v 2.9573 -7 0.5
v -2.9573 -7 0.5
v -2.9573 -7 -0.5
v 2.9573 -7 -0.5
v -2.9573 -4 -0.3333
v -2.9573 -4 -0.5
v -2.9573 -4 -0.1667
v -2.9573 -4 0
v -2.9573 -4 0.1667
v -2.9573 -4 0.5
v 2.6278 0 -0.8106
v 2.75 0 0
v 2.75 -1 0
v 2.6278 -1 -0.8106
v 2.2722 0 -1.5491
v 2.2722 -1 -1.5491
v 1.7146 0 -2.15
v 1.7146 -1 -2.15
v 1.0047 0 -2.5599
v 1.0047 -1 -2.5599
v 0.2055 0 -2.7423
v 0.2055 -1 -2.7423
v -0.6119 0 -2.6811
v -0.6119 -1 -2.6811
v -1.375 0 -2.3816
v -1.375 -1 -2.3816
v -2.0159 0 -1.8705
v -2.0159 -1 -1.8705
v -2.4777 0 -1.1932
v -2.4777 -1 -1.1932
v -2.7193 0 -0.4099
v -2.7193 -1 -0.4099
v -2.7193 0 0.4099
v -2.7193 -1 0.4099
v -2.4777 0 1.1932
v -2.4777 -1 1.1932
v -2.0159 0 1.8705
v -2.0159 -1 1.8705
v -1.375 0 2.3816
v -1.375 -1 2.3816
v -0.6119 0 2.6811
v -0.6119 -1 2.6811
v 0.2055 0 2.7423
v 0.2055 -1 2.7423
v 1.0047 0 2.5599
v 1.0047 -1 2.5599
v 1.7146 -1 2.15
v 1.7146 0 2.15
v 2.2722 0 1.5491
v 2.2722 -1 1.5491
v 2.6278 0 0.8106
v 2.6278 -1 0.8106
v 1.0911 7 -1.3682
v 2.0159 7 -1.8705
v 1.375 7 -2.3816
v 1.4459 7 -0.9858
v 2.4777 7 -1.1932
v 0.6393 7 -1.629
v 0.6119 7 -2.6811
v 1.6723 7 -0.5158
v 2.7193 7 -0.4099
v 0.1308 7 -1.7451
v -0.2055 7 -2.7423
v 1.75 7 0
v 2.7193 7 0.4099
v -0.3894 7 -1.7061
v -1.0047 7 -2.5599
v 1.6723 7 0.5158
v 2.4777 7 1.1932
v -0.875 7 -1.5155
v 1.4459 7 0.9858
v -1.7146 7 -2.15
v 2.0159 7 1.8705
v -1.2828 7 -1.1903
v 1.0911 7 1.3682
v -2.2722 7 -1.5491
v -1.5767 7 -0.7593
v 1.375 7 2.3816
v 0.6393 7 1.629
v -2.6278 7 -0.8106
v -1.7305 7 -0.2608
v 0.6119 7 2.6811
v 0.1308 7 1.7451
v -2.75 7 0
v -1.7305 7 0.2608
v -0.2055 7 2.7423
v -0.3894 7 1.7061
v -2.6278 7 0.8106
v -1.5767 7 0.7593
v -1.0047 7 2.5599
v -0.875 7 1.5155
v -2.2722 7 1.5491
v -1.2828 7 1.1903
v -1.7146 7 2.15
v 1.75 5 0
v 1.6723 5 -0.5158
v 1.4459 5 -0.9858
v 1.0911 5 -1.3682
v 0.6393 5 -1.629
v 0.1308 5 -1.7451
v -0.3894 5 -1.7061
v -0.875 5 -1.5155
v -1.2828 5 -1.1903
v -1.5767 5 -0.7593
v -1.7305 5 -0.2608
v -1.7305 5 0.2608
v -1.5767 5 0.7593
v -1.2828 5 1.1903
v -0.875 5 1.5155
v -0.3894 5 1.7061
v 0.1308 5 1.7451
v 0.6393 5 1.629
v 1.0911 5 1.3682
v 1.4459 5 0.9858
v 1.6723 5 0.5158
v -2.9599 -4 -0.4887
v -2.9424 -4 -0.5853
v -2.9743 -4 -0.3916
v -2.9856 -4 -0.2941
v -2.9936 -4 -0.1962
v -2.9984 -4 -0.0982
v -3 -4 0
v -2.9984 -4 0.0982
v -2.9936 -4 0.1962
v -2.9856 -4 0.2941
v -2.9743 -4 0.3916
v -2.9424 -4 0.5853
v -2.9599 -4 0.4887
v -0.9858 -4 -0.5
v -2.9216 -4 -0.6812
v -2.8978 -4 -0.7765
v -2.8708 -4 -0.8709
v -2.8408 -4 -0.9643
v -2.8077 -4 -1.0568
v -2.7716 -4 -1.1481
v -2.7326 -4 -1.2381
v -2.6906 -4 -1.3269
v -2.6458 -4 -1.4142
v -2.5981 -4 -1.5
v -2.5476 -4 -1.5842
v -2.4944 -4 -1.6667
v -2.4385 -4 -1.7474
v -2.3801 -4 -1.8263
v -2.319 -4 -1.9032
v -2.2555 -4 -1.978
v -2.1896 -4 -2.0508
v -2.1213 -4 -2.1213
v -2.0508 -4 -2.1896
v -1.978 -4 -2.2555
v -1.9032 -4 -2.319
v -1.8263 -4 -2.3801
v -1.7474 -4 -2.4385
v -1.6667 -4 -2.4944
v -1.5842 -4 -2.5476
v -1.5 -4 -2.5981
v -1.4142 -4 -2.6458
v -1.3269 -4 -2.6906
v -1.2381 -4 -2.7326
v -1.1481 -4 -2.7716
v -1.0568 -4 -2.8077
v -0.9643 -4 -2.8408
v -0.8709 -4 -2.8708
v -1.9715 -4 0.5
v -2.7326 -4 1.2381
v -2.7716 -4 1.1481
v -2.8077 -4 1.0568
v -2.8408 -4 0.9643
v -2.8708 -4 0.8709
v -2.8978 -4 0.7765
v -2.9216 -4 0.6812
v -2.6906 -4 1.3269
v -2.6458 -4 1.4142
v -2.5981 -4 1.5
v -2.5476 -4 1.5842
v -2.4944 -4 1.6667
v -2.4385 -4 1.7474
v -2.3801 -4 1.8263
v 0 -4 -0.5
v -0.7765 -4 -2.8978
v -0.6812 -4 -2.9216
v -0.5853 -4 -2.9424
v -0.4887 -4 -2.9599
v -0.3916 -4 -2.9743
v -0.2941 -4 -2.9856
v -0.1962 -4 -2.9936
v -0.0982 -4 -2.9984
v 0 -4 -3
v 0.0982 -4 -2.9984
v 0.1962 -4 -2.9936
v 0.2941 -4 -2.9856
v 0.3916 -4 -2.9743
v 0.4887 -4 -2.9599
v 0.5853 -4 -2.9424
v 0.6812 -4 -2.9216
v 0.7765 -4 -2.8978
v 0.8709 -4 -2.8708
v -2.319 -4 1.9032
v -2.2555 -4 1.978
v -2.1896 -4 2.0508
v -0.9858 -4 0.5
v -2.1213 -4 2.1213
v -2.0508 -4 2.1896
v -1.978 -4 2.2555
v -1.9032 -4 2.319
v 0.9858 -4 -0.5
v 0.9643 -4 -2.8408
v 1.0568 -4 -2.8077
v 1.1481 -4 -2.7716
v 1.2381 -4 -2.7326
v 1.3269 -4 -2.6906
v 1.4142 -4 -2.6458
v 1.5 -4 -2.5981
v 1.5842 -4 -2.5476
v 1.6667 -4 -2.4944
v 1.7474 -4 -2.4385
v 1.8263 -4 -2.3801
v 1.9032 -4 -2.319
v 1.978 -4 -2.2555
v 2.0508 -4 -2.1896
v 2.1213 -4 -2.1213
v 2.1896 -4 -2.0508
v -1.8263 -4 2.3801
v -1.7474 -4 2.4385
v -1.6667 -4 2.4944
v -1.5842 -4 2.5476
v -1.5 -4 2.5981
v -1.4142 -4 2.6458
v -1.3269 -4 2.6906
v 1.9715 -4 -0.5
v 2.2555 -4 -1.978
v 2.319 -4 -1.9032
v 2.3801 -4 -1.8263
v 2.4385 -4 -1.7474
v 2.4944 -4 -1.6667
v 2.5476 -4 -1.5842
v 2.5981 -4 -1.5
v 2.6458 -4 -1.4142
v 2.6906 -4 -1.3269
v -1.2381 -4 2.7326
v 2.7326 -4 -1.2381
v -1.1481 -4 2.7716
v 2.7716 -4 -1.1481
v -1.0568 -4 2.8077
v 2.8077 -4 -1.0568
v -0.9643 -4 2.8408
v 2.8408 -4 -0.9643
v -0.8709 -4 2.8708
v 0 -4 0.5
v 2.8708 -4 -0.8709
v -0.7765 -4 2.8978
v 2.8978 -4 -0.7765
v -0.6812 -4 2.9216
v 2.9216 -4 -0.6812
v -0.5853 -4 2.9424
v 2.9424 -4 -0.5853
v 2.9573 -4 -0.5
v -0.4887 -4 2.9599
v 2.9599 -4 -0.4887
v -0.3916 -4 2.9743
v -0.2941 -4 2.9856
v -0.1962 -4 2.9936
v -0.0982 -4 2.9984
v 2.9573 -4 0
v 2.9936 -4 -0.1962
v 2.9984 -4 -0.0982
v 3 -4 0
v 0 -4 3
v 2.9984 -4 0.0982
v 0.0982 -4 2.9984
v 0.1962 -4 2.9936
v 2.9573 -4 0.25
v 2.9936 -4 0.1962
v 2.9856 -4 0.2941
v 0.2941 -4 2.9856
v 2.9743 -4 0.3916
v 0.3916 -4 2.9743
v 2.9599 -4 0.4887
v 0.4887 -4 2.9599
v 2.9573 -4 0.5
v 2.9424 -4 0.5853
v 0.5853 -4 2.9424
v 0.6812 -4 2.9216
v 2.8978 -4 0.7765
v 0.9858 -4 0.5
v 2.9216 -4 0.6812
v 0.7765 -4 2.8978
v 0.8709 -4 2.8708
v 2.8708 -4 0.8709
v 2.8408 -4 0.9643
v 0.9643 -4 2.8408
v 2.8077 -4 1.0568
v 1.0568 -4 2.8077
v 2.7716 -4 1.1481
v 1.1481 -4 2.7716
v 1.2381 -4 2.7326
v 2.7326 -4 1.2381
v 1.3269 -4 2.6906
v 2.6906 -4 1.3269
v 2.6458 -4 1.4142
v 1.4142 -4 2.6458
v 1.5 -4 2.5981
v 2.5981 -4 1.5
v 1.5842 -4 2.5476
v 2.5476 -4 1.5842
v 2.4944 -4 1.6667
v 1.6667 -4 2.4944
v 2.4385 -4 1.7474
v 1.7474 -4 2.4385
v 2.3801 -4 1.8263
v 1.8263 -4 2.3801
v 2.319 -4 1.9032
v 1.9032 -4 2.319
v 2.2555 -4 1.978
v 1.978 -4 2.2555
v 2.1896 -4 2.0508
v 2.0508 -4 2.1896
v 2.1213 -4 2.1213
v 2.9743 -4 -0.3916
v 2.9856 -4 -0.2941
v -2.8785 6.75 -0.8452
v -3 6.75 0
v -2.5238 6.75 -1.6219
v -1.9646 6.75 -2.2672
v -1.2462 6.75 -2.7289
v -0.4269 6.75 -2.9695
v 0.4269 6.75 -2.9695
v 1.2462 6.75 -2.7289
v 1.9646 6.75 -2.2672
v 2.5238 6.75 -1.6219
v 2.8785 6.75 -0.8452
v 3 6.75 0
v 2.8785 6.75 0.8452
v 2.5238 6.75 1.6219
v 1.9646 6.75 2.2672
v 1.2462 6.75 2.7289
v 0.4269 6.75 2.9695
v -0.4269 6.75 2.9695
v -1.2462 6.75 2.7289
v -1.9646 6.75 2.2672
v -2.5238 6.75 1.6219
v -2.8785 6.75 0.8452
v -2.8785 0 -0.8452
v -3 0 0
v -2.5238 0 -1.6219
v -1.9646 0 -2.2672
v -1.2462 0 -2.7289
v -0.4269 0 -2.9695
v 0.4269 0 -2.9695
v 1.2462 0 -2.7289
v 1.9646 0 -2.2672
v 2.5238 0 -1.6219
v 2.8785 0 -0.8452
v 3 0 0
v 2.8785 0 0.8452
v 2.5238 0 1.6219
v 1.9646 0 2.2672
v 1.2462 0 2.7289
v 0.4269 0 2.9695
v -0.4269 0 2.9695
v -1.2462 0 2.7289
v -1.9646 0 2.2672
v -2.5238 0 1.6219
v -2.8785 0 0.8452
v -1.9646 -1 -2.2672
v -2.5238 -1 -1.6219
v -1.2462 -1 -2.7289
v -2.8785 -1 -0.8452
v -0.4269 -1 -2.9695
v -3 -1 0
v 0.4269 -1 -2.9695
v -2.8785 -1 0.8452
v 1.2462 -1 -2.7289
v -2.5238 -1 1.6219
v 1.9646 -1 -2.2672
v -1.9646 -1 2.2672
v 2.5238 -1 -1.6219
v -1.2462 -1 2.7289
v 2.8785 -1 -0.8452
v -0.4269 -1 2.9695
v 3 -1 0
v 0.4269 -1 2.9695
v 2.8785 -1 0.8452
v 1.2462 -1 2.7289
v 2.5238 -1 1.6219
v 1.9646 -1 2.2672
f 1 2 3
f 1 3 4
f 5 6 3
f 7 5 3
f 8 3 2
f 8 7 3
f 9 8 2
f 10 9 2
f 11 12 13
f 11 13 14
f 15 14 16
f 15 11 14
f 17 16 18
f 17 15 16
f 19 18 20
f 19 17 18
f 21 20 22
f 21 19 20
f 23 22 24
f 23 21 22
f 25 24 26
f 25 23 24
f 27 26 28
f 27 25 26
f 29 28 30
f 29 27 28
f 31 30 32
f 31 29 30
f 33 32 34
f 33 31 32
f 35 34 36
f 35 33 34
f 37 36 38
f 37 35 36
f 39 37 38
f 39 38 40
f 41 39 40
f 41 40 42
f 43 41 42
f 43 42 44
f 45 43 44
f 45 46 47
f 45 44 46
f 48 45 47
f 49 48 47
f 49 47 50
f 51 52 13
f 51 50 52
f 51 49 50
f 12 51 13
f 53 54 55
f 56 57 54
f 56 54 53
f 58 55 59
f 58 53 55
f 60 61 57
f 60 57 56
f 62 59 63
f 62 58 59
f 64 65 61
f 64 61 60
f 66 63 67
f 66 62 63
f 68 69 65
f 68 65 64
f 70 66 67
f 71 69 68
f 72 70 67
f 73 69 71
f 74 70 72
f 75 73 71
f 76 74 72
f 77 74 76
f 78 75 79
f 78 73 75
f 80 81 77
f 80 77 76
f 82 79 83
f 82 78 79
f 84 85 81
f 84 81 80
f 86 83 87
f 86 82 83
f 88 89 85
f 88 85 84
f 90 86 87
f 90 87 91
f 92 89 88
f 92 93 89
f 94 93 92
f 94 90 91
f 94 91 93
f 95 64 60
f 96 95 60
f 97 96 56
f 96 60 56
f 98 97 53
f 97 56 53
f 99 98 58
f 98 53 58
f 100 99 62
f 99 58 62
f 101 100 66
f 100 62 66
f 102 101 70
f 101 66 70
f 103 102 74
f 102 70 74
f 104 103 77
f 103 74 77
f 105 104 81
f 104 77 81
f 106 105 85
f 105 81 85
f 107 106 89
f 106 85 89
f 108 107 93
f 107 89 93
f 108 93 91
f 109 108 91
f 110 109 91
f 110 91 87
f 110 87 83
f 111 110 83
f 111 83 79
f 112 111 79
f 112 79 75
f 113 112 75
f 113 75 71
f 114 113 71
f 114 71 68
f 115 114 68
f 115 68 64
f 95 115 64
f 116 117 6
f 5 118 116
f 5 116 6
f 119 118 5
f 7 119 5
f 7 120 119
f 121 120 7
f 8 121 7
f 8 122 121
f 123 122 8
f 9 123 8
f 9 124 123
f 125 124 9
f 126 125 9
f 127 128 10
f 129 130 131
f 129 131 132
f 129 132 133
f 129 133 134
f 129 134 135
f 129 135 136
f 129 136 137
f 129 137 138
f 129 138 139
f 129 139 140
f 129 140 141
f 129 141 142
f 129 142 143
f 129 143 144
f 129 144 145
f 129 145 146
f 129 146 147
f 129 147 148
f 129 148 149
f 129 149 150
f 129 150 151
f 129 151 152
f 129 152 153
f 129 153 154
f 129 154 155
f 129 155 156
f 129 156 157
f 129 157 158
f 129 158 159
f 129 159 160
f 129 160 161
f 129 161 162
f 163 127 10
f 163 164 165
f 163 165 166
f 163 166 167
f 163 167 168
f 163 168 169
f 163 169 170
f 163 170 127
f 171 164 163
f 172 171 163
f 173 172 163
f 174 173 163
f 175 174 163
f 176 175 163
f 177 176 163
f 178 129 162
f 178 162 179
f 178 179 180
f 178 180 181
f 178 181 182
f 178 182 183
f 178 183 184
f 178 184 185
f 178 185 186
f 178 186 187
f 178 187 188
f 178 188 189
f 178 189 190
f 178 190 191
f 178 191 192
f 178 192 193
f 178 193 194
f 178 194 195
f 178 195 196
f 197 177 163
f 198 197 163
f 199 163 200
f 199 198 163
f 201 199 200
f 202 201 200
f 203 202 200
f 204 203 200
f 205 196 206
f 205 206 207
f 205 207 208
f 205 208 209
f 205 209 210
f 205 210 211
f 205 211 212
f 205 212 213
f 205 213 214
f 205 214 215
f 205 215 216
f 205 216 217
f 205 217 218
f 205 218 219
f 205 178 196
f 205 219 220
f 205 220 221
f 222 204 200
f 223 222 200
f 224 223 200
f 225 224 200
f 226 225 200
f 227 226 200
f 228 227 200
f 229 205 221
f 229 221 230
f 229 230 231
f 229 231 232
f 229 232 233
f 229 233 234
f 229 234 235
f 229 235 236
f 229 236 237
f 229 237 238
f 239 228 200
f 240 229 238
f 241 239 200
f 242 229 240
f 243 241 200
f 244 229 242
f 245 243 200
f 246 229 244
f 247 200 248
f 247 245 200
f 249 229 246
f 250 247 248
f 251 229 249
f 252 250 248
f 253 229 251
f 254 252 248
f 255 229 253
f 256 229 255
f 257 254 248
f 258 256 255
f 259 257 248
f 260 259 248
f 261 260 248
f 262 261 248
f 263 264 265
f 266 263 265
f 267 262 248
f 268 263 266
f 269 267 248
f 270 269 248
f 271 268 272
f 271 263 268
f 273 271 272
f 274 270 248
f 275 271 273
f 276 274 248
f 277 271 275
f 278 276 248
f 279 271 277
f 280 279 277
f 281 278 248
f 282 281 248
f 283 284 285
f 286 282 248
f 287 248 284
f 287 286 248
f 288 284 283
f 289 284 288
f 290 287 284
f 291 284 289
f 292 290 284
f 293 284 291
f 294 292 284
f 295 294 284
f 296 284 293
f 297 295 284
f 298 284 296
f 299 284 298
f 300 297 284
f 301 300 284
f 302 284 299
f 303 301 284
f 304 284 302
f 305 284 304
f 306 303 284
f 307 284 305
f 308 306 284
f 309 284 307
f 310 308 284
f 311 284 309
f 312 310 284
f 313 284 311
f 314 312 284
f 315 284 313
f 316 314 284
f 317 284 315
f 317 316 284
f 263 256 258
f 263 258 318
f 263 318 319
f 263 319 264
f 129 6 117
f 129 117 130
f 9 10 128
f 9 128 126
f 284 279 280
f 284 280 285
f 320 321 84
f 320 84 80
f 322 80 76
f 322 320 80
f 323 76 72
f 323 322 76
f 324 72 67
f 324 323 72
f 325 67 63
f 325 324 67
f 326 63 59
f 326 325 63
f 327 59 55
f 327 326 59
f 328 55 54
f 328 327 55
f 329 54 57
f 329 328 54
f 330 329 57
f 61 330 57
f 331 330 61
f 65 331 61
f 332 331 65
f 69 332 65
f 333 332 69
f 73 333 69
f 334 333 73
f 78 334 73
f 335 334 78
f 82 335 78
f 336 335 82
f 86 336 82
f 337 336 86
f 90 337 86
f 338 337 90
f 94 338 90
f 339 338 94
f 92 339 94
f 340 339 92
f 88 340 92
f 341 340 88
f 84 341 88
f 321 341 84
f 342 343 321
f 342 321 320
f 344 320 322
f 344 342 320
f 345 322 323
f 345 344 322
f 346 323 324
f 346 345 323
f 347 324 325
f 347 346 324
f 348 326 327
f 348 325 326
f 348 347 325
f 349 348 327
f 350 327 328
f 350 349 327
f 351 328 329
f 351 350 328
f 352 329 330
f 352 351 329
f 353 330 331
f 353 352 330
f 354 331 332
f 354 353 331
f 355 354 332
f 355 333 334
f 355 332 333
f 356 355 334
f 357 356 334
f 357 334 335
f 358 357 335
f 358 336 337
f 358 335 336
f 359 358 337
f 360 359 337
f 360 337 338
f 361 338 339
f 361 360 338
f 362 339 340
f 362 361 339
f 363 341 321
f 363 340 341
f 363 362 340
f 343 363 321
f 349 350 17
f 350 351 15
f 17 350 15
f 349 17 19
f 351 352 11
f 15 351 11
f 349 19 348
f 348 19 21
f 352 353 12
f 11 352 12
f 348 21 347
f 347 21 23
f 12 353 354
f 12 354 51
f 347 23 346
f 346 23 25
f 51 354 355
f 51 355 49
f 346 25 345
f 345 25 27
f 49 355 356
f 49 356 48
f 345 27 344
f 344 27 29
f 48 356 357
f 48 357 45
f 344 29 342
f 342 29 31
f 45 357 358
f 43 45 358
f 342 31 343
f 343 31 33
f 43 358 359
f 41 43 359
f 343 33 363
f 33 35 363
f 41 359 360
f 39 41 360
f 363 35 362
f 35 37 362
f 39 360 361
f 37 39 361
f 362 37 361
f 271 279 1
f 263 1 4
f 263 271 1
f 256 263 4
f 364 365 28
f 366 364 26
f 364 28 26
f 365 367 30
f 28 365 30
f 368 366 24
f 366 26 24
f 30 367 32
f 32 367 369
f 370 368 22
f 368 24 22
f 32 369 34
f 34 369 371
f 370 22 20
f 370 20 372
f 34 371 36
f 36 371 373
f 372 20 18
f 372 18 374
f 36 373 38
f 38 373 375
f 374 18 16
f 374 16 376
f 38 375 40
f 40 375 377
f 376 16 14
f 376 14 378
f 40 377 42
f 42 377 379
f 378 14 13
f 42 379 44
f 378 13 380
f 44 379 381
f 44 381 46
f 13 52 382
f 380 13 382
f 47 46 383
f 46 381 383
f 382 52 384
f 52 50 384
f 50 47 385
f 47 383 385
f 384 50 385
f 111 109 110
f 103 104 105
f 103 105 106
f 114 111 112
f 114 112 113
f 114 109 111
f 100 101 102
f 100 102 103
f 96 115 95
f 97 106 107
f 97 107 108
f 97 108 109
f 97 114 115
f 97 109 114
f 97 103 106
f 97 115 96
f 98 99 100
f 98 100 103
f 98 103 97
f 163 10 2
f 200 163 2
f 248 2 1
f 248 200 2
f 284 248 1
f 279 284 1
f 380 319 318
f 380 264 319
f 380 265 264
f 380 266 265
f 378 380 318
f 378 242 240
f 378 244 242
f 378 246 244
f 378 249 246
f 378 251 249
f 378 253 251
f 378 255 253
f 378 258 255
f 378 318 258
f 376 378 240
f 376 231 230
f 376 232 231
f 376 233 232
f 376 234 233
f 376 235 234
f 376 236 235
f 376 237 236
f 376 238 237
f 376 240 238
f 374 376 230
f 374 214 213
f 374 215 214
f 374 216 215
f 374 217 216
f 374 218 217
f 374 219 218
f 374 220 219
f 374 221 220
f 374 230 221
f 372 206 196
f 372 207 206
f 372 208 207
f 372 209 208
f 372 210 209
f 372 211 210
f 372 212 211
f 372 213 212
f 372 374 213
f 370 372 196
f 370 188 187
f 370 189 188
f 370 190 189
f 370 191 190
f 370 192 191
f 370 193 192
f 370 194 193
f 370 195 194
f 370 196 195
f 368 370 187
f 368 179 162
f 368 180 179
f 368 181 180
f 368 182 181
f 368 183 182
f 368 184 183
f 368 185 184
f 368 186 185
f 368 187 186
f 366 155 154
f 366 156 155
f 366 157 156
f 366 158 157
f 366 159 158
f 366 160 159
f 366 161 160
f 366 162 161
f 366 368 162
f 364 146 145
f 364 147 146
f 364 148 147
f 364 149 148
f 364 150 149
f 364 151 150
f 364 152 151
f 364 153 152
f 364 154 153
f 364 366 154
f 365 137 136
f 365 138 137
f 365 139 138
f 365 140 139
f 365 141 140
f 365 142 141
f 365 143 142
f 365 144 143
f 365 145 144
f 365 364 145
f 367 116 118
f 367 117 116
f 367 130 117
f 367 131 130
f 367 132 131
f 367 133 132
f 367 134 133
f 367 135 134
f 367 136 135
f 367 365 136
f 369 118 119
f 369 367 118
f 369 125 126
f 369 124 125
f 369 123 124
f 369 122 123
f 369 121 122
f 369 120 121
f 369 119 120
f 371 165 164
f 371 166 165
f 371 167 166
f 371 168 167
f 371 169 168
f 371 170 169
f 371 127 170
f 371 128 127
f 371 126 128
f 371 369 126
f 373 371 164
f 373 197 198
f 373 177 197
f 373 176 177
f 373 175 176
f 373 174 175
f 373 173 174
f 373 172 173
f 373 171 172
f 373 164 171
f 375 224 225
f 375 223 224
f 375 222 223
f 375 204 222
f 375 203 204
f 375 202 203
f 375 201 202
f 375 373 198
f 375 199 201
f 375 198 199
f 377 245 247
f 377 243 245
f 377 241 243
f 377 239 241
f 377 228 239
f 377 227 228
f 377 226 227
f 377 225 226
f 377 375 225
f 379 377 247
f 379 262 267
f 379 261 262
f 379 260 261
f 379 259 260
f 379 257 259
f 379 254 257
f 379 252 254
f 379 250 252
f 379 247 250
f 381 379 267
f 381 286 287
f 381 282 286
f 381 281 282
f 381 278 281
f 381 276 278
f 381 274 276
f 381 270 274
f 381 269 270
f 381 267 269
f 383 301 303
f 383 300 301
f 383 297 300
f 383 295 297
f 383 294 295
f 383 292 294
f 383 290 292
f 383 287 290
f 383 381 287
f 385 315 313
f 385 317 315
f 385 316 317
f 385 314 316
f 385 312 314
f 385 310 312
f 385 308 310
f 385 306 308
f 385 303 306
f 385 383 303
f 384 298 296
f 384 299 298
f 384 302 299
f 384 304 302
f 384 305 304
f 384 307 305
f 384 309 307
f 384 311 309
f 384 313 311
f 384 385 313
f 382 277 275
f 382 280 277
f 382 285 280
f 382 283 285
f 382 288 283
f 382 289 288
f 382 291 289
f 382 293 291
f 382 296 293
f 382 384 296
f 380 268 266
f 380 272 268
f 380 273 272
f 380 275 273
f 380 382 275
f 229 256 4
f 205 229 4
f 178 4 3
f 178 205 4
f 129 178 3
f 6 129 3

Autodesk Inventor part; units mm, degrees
ref_plane "YZ Plane" through (0, 0, 0) normal (1, 0, 0) x (0, 1, 0)
ref_plane "XZ Plane" through (0, 0, 0) normal (0, 1, 0) x (-1, 0, 0)
ref_plane "XY Plane" through (0, 0, 0) normal (0, 0, 1) x (1, 0, 0)
sketch "Sketch1" plane through (0, 0, 0) normal (0, 1, 0) x (-1, 0, 0)
  circle A0 centre (0, 0) radius 3
  dimension "d0" = 6
extrude "Extrusion1" add sketch "Sketch1" along normal blind 7
chamfer "Chamfer1" distance 0.25 angle 45 1 edges at (3, 7, 0)
sketch "Sketch2" plane through (0, 7, 0) normal (0, 1, 0) x (1, 0, 0)
  circle A0 centre (0, 0) radius 1.75
  dimension "d6" = 3.5
extrude "Extrusion2" cut sketch "Sketch2" against normal blind 2
sketch "Sketch3" plane through (0, 0, 0) normal (0, -1, 0) x (1, 0, 0)
  circle A0 centre (0, 0) radius 2.75
extrude "Extrusion3" add sketch "Sketch3" along normal blind 1
sketch "Sketch4" plane through (0, -1, 0) normal (0, -1, 0) x (1, 0, 0)
  circle A0 centre (0, 0) radius 3
extrude "Extrusion4" add sketch "Sketch4" along normal blind 3
sketch "Sketch5" plane through (0, -4, 0) normal (0, -1, 0) x (1, 0, 0)
  line L0 (2.9573, 0.5) -> (2.9573, -0.5)
  line L1 (2.9573, -0.5) -> (-2.9573, -0.5)
  line L2 (-2.9573, -0.5) -> (-2.9573, 0.5)
  line L3 (-2.9573, 0.5) -> (2.9573, 0.5)
  line L4 (2.9573, 0.5) -> (-2.9573, -0.5) construction
  line L5 (2.9573, -0.5) -> (-2.9573, 0.5) construction
  point P0 (0, 0)
  dimension "d14" = 1
extrude "Extrusion5" add sketch "Sketch5" along normal blind 3
properties part number "Laser Diode"
